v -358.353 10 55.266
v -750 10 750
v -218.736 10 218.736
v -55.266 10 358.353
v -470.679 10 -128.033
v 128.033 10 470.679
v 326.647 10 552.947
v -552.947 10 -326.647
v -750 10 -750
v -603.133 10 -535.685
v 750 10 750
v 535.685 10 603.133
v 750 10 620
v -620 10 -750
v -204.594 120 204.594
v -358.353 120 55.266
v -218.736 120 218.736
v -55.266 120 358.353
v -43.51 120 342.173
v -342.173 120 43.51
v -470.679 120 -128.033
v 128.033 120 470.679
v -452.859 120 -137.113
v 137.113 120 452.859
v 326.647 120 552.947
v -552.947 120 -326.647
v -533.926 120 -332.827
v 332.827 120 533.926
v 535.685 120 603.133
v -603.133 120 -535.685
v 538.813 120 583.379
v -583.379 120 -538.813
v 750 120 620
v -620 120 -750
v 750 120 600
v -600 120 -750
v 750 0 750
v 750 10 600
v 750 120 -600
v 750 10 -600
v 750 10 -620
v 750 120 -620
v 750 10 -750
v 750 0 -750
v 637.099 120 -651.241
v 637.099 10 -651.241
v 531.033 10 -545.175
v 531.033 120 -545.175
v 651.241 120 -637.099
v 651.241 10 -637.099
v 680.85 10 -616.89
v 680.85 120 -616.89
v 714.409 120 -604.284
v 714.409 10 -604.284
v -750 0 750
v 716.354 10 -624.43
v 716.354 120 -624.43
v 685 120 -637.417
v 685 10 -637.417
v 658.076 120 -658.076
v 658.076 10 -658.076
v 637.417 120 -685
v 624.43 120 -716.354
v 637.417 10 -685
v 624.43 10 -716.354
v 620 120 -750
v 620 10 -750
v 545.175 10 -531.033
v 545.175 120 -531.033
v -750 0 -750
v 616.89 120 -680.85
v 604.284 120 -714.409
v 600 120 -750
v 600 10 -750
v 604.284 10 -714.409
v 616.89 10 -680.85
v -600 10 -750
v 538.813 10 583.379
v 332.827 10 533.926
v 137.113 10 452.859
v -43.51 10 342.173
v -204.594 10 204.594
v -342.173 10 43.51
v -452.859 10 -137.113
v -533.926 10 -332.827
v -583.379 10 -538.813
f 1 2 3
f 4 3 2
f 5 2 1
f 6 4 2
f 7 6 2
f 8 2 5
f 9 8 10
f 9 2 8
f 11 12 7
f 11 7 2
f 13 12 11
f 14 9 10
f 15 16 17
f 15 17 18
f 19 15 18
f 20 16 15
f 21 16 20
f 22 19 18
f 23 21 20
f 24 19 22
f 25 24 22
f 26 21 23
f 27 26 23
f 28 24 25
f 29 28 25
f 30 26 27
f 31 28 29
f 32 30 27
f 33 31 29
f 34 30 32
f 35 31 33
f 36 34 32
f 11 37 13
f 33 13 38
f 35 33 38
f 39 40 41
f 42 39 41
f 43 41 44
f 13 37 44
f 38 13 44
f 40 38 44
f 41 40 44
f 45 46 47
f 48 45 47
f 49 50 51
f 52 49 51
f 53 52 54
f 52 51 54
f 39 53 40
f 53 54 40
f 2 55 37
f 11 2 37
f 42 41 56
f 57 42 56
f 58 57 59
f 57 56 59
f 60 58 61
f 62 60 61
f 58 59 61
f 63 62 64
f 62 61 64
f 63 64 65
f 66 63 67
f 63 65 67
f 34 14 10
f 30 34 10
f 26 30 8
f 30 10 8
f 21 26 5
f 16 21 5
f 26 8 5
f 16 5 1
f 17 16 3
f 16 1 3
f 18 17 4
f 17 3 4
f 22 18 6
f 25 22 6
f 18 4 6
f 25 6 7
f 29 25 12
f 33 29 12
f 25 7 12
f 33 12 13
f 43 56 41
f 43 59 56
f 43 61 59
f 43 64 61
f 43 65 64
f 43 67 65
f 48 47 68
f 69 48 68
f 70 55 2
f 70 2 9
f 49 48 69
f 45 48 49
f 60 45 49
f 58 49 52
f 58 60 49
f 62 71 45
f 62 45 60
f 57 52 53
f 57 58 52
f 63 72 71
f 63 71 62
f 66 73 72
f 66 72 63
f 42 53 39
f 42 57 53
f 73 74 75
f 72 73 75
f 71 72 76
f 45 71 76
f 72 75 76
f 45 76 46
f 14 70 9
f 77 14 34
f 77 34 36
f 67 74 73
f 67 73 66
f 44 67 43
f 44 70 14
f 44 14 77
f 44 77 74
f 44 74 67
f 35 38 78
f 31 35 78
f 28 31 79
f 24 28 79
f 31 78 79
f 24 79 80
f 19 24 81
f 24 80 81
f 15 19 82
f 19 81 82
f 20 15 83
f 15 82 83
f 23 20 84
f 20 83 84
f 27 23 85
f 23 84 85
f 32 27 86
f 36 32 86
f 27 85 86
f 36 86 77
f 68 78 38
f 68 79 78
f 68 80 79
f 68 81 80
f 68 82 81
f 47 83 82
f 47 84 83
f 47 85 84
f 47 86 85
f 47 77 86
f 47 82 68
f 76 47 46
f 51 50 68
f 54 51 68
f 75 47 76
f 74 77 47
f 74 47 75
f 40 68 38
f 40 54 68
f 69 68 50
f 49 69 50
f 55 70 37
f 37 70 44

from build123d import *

# Parameters (mm, degrees)
SKETCH2_W           = 1500
SKETCH2_H           = 1500
BOSS_EXTRUDE1_DEPTH = 10
BOSS_EXTRUDE2_DEPTH = 110
BOSS_EXTRUDE3_DEPTH = 110


with BuildPart() as part:
    # Sketch2 → Boss-Extrude1 (new body)
    with BuildSketch(Plane(origin=(0, 0, 0), x_dir=(1, 0, 0), z_dir=(0, 1, 0))):
        Rectangle(SKETCH2_W, SKETCH2_H)
    extrude(amount=BOSS_EXTRUDE1_DEPTH)

    # Sketch3 → Boss-Extrude2 (add)
    with BuildSketch(Plane(origin=(0, 10, 0), x_dir=(1, 0, 0), z_dir=(0, 1, 0))):
        with BuildLine():
            ThreePointArc((750, -600), (-204.594154602, -204.594154602), (-600, 750))
            Line((-600, 750), (-620, 750))
            ThreePointArc((-620, 750), (-218.736290226, -218.736290226), (750, -620))
            Line((750, -620), (750, -600))
        make_face()
        with BuildLine():
            Line((620, 750), (600, 750))
            ThreePointArc((600, 750), (643.933982822, 643.933982822), (750, 600))
            Line((750, 600), (750, 620))
            ThreePointArc((750, 620), (658.076118446, 658.076118446), (620, 750))
        make_face()
    extrude(amount=BOSS_EXTRUDE2_DEPTH)

    # Sketch4 → Boss-Extrude3 (add)
    with BuildSketch(Plane(origin=(0, 10, 0), x_dir=(1, 0, 0), z_dir=(0, 1, 0))):
        Polygon((545.174998191, 531.032862568), (651.241015369, 637.098879746), (637.098879746, 651.241015369), (531.032862568, 545.174998191), align=None)
    extrude(amount=BOSS_EXTRUDE3_DEPTH)


solid = part.part
